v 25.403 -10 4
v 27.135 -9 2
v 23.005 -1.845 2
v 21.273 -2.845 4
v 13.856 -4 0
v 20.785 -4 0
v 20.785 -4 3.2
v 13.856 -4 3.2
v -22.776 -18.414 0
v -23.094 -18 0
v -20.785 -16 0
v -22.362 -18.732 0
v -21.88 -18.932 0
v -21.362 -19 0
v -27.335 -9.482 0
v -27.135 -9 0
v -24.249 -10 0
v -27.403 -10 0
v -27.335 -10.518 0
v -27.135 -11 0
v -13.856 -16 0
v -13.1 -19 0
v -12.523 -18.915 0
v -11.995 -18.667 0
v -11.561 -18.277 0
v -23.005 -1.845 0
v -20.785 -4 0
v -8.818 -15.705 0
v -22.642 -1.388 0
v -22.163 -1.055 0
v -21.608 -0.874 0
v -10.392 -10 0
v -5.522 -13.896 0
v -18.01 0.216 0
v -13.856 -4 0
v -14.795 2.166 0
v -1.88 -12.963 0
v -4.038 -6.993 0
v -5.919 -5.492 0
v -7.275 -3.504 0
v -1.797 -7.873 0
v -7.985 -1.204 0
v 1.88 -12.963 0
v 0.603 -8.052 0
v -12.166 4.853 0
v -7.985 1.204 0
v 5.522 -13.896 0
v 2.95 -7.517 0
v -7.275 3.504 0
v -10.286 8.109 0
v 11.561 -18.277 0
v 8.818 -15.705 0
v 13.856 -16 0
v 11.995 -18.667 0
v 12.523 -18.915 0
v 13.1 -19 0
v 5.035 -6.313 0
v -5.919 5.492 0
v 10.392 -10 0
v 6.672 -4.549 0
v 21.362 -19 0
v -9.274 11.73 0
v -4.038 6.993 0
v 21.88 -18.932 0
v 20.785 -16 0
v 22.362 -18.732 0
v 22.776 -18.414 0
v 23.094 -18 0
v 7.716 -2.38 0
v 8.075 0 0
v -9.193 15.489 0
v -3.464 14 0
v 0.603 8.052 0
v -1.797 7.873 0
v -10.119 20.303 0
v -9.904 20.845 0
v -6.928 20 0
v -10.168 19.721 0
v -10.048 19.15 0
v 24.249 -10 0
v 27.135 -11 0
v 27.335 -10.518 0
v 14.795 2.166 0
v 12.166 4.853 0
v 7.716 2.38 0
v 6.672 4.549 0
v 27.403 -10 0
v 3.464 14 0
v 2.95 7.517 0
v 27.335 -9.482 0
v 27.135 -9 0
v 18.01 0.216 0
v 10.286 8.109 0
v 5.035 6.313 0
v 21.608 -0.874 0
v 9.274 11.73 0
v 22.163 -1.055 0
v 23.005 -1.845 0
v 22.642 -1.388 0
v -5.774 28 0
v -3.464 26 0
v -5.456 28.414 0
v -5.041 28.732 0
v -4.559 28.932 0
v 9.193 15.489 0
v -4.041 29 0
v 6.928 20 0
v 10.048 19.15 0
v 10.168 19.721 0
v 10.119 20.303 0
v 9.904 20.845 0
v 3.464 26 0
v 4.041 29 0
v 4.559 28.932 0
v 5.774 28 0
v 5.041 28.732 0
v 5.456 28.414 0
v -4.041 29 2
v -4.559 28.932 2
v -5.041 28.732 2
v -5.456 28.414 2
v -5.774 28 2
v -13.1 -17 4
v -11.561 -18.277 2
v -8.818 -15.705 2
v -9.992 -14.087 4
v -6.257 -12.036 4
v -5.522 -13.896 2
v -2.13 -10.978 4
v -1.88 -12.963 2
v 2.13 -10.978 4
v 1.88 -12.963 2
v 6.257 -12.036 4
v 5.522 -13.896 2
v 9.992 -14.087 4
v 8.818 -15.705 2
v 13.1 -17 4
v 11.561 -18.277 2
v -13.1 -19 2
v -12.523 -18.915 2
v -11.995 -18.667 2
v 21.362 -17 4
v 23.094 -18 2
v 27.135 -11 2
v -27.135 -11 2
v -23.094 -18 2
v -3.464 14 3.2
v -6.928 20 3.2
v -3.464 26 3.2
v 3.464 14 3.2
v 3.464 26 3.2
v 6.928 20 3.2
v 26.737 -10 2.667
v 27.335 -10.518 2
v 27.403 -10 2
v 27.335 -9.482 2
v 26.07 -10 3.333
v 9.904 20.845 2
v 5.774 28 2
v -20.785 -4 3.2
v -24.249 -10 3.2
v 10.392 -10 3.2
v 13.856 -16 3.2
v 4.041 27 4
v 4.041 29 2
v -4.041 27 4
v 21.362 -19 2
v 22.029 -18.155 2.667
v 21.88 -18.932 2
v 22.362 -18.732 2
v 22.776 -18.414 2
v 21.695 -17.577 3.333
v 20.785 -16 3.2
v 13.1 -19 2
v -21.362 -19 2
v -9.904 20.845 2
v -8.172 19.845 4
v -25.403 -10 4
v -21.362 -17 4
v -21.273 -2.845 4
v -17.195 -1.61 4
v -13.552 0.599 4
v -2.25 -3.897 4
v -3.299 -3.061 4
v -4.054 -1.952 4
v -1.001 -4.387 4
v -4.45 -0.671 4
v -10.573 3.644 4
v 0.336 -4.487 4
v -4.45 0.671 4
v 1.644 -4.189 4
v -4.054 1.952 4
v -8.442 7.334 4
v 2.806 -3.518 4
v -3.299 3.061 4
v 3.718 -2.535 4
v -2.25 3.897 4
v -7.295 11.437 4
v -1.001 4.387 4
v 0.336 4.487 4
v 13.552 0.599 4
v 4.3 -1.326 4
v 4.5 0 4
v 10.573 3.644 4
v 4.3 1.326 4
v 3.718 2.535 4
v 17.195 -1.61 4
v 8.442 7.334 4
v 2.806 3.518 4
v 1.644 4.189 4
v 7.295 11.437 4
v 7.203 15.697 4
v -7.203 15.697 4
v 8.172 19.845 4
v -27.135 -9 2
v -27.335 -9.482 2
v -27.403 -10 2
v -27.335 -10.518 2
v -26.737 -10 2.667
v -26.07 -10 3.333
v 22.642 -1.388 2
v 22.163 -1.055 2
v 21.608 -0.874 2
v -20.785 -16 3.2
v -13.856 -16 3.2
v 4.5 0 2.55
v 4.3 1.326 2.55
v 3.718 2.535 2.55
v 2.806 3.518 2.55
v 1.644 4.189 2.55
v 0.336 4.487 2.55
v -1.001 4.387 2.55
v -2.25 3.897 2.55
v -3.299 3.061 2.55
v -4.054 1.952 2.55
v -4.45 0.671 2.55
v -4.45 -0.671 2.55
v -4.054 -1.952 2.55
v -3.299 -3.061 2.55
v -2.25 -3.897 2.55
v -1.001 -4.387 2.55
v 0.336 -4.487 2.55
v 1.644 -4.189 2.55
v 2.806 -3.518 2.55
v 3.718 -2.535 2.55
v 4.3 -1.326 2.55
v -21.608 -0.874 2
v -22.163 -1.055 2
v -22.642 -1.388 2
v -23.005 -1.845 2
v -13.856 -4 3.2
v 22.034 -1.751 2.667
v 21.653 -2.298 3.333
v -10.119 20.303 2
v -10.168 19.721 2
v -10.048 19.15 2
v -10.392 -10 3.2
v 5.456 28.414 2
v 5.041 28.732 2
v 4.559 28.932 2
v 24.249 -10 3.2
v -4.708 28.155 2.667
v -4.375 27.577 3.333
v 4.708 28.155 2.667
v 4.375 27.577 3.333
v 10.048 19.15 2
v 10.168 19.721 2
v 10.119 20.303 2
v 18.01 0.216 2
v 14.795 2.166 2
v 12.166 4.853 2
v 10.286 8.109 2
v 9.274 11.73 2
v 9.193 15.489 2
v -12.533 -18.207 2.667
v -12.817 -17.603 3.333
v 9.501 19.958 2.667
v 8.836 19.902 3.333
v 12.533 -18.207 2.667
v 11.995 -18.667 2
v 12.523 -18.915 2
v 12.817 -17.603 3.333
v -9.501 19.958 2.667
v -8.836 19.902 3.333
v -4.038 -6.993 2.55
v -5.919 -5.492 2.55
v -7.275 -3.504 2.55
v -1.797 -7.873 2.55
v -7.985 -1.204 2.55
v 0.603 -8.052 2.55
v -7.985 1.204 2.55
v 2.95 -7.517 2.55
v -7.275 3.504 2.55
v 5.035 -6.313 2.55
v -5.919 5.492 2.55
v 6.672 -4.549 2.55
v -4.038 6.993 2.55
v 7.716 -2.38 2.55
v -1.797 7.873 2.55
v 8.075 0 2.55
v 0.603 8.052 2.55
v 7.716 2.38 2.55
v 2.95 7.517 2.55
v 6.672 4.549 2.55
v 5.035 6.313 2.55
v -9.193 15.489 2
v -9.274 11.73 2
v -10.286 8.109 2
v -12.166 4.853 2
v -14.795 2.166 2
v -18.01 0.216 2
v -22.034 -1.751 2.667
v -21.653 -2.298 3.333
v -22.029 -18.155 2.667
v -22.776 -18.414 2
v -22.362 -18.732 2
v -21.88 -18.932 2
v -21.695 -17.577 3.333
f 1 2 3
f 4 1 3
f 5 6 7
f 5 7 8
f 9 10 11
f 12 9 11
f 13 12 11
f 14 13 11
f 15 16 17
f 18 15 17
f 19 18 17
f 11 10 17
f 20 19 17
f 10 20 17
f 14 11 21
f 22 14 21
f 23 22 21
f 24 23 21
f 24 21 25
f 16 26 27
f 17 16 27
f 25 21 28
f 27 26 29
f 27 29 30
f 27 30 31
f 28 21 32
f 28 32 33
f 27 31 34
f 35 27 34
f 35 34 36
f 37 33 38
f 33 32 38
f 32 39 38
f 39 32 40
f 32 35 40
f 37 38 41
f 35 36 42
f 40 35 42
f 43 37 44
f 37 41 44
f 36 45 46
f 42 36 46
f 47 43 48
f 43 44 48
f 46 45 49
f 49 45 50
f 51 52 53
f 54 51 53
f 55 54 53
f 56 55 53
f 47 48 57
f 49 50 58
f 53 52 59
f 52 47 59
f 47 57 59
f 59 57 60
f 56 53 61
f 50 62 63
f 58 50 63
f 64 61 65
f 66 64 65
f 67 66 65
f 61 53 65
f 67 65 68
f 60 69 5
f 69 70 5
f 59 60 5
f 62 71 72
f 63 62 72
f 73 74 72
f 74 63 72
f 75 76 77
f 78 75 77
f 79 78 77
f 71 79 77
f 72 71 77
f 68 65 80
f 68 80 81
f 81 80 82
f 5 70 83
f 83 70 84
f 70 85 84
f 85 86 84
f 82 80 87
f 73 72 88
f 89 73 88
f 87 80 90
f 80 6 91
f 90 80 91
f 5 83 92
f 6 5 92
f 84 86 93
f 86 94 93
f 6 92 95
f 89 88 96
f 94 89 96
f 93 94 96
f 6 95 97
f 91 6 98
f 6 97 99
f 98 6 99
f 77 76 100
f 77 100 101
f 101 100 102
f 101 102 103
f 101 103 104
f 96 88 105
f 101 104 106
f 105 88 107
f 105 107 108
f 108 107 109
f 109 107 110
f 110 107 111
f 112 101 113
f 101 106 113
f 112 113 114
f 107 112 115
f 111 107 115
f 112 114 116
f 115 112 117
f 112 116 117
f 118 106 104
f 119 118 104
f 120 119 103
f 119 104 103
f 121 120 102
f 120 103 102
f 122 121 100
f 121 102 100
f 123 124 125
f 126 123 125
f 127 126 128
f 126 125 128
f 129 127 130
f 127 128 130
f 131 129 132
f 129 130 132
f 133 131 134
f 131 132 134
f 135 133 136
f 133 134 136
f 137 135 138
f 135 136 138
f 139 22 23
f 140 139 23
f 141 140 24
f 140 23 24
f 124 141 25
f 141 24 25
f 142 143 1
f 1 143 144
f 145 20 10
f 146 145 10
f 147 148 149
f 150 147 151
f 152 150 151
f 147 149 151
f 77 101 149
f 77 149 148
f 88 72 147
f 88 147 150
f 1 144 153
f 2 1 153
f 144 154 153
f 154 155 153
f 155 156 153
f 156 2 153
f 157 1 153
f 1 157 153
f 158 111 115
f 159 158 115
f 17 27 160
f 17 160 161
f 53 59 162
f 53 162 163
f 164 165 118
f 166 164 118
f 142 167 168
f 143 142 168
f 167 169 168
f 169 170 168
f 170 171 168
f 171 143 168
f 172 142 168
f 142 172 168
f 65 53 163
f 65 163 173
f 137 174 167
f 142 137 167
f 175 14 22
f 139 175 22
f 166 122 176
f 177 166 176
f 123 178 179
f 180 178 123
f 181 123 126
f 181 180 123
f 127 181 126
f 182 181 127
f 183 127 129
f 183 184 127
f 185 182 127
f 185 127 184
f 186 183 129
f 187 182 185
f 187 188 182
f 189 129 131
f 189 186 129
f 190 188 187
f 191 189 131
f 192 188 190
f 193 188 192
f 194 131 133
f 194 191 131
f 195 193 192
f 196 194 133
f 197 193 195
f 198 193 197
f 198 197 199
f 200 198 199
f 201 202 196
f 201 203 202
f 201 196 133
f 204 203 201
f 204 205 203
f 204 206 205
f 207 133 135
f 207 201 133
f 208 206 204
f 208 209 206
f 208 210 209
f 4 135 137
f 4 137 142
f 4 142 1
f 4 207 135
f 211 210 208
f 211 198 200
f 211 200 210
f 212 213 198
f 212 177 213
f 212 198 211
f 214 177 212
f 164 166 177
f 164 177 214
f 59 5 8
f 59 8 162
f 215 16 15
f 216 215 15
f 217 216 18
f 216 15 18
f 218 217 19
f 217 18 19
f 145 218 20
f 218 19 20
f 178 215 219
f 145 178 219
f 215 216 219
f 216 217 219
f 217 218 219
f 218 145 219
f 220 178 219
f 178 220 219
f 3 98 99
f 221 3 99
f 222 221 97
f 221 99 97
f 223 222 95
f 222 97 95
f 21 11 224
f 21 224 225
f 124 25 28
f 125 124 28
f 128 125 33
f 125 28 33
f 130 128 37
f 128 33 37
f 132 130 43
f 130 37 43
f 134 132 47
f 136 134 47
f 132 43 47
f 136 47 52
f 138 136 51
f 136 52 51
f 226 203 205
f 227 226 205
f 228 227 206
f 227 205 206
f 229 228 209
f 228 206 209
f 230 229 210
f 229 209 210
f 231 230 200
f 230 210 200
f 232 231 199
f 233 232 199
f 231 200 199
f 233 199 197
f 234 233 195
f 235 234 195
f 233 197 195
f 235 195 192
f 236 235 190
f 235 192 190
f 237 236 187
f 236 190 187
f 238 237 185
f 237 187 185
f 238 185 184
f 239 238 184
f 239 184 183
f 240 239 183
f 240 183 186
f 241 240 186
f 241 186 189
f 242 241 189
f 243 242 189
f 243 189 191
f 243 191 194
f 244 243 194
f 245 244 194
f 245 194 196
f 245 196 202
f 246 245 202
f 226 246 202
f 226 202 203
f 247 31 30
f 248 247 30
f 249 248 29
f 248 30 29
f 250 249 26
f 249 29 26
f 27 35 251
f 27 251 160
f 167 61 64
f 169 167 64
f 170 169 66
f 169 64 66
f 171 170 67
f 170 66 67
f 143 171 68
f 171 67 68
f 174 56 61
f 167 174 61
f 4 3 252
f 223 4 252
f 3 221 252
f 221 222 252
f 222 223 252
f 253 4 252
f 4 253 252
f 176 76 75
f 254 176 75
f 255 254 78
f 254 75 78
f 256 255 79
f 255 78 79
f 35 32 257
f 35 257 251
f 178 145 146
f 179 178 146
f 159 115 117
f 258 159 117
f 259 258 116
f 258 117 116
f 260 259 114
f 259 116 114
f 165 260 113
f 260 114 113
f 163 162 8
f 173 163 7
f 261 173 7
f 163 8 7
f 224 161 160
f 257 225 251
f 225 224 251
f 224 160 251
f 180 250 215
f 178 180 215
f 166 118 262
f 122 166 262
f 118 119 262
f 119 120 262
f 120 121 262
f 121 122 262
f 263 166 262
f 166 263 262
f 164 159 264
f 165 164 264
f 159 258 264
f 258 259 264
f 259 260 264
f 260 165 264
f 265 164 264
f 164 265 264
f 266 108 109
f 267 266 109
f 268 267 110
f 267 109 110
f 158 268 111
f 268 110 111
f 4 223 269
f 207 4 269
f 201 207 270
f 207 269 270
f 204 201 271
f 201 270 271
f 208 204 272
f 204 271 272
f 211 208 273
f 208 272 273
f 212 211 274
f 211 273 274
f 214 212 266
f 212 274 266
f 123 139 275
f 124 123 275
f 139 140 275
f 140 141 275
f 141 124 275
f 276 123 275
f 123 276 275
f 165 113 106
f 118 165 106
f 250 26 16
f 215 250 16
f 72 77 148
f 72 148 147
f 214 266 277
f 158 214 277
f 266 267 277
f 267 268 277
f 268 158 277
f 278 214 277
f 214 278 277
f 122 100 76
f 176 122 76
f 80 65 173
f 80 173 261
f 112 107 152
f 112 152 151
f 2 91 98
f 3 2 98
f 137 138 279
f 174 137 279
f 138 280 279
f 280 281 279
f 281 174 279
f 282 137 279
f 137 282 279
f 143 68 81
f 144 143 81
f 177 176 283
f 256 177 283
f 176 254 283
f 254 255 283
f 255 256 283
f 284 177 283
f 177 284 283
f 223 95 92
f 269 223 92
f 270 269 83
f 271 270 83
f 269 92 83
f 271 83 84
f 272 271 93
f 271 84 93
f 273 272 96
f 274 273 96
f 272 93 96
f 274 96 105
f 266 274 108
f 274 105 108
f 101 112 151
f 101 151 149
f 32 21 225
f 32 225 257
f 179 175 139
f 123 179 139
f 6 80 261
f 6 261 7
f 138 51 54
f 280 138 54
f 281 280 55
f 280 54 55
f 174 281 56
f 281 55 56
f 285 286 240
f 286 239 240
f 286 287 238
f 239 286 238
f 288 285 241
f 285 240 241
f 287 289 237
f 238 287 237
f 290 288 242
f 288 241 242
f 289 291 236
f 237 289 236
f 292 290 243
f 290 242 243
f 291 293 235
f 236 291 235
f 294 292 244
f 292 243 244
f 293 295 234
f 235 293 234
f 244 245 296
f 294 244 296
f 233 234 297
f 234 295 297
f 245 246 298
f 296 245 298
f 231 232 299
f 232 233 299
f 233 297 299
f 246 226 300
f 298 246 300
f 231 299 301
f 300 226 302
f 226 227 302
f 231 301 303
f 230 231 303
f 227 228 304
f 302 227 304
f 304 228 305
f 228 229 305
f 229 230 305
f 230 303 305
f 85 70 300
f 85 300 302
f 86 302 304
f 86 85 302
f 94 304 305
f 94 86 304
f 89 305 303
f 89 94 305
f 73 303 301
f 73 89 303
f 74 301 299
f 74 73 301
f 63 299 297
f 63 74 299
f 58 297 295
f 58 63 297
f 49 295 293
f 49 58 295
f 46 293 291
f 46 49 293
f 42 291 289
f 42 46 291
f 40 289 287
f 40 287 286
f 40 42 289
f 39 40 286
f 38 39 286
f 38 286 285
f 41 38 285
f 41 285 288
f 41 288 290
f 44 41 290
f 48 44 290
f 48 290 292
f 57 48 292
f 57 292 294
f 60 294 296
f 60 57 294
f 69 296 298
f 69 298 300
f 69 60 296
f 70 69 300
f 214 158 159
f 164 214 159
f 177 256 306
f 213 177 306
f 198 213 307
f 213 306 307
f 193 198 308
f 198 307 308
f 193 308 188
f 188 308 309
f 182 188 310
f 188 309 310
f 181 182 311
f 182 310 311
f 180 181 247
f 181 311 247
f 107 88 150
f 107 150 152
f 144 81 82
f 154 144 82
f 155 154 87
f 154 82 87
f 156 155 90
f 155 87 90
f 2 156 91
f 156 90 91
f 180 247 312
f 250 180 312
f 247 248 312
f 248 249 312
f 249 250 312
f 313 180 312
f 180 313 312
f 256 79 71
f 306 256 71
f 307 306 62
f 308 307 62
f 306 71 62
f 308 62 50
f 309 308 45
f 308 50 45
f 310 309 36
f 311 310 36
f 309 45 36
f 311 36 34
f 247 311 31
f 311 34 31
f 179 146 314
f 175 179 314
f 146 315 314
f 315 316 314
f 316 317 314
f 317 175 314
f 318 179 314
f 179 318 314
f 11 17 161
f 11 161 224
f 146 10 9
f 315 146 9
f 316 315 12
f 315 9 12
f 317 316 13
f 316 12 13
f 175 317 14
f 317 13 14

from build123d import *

# Parameters (mm, degrees)
F1_DEPTH = 4
F2_R     = 8.075
F3_DEPTH = 2.55
F5_DEPTH = 3.2
F6_SIZE  = 1.99999
F7_R     = 4.5
F8_DEPTH = 25


# Not quite as in the source:
# - a fillet or chamfer is up to 0.001 mm smaller than in the source, because OpenCascade refuses the exact size


with BuildPart() as f1:
    # F0 (on Top) → F1 (new body)
    with BuildSketch(Plane.XY):
        with BuildLine():
            Line((-5.7735026919, 28), (-9.9042445516, 20.8453452261))
            ThreePointArc((-9.9042445516, 20.8453452261), (-10.1650850266, 20.0138217399), (-10.0475406836, 19.1503100787))
            ThreePointArc((-10.0475406836, 19.1503100787), (-11.1235598668, 6.4221902835), (-21.6084253603, -0.8737295618))
            ThreePointArc((-21.6084253603, -0.8737295618), (-22.4150205669, -1.2036890053), (-23.0047207922, -1.8453452261))
            Line((-23.0047207922, -1.8453452261), (-27.1354626519, -9))
            ThreePointArc((-27.1354626519, -9), (-27.4034118443, -10), (-27.1354626519, -11))
            Line((-27.1354626519, -11), (-23.0940107676, -18))
            ThreePointArc((-23.0940107676, -18), (-22.36195996, -18.7320508076), (-21.36195996, -19))
            Line((-21.36195996, -19), (-13.1004762407, -19))
            ThreePointArc((-13.1004762407, -19), (-12.2499355402, -18.8101327346), (-11.5608846767, -18.2765805169))
            ThreePointArc((-11.5608846767, -18.2765805169), (0, -12.8443805669), (11.5608846767, -18.2765805169))
            ThreePointArc((11.5608846767, -18.2765805169), (12.2499355402, -18.8101327346), (13.1004762407, -19))
            Line((13.1004762407, -19), (21.36195996, -19))
            ThreePointArc((21.36195996, -19), (22.36195996, -18.7320508076), (23.0940107676, -18))
            Line((23.0940107676, -18), (27.1354626519, -11))
            ThreePointArc((27.1354626519, -11), (27.4034118443, -10), (27.1354626519, -9))
            Line((27.1354626519, -9), (23.0047207922, -1.8453452261))
            ThreePointArc((23.0047207922, -1.8453452261), (22.4150205669, -1.2036890053), (21.6084253603, -0.8737295618))
            ThreePointArc((21.6084253603, -0.8737295618), (11.1235598668, 6.4221902835), (10.0475406836, 19.1503100787))
            ThreePointArc((10.0475406836, 19.1503100787), (10.1650850266, 20.0138217399), (9.9042445516, 20.8453452261))
            Line((9.9042445516, 20.8453452261), (5.7735026919, 28))
            ThreePointArc((5.7735026919, 28), (5.0414518843, 28.7320508076), (4.0414518843, 29))
            Line((4.0414518843, 29), (-4.0414518843, 29))
            ThreePointArc((-4.0414518843, 29), (-5.0414518843, 28.7320508076), (-5.7735026919, 28))
        make_face()
    extrude(amount=F1_DEPTH)

    # F2 (on face) → F3 (cut)
    with BuildSketch(Plane.XY):
        Circle(F2_R)
    extrude(amount=F3_DEPTH, mode=Mode.SUBTRACT)

    # F4 (on face) → F5 (cut)
    with BuildSketch(Plane.XY):
        Polygon((6.9282032303, 20), (3.4641016151, 26), (-3.4641016151, 26), (-6.9282032303, 20), (-3.4641016151, 14), (3.4641016151, 14), align=None)
        Polygon((-13.8564064606, -16), (-10.3923048454, -10), (-13.8564064606, -4), (-20.7846096908, -4), (-24.248711306, -10), (-20.7846096908, -16), align=None)
        Polygon((20.7846096908, -4), (13.8564064606, -4), (10.3923048454, -10), (13.8564064606, -16), (20.7846096908, -16), (24.248711306, -10), align=None)
    extrude(amount=F5_DEPTH, mode=Mode.SUBTRACT)

    # F6 (size 2 in the source; OpenCascade refuses exactly that, so slightly less here)
    f6_edges = [f1.edges().sort_by_distance(p)[0] for p in [
        (10.165085, 20.013822, 4),
        (7.838874, 24.422673, 4),
        (5.041452, 28.732051, 4),
        (0, 29, 4),
        (-5.041452, 28.732051, 4),
        (-7.838874, 24.422673, 4),
        (-10.165085, 20.013822, 4),
        (-11.12356, 6.42219, 4),
        (-22.415021, -1.203689, 4),
        (-25.070092, -5.422673, 4),
        (-27.403412, -10, 4),
        (-25.114737, -14.5, 4),
        (-22.36196, -18.732051, 4),
        (-17.231218, -19, 4),
        (-12.249936, -18.810133, 4),
        (0, -12.844381, 4),
        (12.249936, -18.810133, 4),
        (17.231218, -19, 4),
        (22.36196, -18.732051, 4),
        (25.114737, -14.5, 4),
        (27.403412, -10, 4),
        (25.070092, -5.422673, 4),
        (22.415021, -1.203689, 4),
        (11.12356, 6.42219, 4),
    ]]
    chamfer(f6_edges, length=F6_SIZE)

    # F7 (on face) → F8 (cut)
    with BuildSketch(Plane.XY.offset(4)):
        Circle(F7_R)
    extrude(amount=-F8_DEPTH, mode=Mode.SUBTRACT)


solid = f1.part
